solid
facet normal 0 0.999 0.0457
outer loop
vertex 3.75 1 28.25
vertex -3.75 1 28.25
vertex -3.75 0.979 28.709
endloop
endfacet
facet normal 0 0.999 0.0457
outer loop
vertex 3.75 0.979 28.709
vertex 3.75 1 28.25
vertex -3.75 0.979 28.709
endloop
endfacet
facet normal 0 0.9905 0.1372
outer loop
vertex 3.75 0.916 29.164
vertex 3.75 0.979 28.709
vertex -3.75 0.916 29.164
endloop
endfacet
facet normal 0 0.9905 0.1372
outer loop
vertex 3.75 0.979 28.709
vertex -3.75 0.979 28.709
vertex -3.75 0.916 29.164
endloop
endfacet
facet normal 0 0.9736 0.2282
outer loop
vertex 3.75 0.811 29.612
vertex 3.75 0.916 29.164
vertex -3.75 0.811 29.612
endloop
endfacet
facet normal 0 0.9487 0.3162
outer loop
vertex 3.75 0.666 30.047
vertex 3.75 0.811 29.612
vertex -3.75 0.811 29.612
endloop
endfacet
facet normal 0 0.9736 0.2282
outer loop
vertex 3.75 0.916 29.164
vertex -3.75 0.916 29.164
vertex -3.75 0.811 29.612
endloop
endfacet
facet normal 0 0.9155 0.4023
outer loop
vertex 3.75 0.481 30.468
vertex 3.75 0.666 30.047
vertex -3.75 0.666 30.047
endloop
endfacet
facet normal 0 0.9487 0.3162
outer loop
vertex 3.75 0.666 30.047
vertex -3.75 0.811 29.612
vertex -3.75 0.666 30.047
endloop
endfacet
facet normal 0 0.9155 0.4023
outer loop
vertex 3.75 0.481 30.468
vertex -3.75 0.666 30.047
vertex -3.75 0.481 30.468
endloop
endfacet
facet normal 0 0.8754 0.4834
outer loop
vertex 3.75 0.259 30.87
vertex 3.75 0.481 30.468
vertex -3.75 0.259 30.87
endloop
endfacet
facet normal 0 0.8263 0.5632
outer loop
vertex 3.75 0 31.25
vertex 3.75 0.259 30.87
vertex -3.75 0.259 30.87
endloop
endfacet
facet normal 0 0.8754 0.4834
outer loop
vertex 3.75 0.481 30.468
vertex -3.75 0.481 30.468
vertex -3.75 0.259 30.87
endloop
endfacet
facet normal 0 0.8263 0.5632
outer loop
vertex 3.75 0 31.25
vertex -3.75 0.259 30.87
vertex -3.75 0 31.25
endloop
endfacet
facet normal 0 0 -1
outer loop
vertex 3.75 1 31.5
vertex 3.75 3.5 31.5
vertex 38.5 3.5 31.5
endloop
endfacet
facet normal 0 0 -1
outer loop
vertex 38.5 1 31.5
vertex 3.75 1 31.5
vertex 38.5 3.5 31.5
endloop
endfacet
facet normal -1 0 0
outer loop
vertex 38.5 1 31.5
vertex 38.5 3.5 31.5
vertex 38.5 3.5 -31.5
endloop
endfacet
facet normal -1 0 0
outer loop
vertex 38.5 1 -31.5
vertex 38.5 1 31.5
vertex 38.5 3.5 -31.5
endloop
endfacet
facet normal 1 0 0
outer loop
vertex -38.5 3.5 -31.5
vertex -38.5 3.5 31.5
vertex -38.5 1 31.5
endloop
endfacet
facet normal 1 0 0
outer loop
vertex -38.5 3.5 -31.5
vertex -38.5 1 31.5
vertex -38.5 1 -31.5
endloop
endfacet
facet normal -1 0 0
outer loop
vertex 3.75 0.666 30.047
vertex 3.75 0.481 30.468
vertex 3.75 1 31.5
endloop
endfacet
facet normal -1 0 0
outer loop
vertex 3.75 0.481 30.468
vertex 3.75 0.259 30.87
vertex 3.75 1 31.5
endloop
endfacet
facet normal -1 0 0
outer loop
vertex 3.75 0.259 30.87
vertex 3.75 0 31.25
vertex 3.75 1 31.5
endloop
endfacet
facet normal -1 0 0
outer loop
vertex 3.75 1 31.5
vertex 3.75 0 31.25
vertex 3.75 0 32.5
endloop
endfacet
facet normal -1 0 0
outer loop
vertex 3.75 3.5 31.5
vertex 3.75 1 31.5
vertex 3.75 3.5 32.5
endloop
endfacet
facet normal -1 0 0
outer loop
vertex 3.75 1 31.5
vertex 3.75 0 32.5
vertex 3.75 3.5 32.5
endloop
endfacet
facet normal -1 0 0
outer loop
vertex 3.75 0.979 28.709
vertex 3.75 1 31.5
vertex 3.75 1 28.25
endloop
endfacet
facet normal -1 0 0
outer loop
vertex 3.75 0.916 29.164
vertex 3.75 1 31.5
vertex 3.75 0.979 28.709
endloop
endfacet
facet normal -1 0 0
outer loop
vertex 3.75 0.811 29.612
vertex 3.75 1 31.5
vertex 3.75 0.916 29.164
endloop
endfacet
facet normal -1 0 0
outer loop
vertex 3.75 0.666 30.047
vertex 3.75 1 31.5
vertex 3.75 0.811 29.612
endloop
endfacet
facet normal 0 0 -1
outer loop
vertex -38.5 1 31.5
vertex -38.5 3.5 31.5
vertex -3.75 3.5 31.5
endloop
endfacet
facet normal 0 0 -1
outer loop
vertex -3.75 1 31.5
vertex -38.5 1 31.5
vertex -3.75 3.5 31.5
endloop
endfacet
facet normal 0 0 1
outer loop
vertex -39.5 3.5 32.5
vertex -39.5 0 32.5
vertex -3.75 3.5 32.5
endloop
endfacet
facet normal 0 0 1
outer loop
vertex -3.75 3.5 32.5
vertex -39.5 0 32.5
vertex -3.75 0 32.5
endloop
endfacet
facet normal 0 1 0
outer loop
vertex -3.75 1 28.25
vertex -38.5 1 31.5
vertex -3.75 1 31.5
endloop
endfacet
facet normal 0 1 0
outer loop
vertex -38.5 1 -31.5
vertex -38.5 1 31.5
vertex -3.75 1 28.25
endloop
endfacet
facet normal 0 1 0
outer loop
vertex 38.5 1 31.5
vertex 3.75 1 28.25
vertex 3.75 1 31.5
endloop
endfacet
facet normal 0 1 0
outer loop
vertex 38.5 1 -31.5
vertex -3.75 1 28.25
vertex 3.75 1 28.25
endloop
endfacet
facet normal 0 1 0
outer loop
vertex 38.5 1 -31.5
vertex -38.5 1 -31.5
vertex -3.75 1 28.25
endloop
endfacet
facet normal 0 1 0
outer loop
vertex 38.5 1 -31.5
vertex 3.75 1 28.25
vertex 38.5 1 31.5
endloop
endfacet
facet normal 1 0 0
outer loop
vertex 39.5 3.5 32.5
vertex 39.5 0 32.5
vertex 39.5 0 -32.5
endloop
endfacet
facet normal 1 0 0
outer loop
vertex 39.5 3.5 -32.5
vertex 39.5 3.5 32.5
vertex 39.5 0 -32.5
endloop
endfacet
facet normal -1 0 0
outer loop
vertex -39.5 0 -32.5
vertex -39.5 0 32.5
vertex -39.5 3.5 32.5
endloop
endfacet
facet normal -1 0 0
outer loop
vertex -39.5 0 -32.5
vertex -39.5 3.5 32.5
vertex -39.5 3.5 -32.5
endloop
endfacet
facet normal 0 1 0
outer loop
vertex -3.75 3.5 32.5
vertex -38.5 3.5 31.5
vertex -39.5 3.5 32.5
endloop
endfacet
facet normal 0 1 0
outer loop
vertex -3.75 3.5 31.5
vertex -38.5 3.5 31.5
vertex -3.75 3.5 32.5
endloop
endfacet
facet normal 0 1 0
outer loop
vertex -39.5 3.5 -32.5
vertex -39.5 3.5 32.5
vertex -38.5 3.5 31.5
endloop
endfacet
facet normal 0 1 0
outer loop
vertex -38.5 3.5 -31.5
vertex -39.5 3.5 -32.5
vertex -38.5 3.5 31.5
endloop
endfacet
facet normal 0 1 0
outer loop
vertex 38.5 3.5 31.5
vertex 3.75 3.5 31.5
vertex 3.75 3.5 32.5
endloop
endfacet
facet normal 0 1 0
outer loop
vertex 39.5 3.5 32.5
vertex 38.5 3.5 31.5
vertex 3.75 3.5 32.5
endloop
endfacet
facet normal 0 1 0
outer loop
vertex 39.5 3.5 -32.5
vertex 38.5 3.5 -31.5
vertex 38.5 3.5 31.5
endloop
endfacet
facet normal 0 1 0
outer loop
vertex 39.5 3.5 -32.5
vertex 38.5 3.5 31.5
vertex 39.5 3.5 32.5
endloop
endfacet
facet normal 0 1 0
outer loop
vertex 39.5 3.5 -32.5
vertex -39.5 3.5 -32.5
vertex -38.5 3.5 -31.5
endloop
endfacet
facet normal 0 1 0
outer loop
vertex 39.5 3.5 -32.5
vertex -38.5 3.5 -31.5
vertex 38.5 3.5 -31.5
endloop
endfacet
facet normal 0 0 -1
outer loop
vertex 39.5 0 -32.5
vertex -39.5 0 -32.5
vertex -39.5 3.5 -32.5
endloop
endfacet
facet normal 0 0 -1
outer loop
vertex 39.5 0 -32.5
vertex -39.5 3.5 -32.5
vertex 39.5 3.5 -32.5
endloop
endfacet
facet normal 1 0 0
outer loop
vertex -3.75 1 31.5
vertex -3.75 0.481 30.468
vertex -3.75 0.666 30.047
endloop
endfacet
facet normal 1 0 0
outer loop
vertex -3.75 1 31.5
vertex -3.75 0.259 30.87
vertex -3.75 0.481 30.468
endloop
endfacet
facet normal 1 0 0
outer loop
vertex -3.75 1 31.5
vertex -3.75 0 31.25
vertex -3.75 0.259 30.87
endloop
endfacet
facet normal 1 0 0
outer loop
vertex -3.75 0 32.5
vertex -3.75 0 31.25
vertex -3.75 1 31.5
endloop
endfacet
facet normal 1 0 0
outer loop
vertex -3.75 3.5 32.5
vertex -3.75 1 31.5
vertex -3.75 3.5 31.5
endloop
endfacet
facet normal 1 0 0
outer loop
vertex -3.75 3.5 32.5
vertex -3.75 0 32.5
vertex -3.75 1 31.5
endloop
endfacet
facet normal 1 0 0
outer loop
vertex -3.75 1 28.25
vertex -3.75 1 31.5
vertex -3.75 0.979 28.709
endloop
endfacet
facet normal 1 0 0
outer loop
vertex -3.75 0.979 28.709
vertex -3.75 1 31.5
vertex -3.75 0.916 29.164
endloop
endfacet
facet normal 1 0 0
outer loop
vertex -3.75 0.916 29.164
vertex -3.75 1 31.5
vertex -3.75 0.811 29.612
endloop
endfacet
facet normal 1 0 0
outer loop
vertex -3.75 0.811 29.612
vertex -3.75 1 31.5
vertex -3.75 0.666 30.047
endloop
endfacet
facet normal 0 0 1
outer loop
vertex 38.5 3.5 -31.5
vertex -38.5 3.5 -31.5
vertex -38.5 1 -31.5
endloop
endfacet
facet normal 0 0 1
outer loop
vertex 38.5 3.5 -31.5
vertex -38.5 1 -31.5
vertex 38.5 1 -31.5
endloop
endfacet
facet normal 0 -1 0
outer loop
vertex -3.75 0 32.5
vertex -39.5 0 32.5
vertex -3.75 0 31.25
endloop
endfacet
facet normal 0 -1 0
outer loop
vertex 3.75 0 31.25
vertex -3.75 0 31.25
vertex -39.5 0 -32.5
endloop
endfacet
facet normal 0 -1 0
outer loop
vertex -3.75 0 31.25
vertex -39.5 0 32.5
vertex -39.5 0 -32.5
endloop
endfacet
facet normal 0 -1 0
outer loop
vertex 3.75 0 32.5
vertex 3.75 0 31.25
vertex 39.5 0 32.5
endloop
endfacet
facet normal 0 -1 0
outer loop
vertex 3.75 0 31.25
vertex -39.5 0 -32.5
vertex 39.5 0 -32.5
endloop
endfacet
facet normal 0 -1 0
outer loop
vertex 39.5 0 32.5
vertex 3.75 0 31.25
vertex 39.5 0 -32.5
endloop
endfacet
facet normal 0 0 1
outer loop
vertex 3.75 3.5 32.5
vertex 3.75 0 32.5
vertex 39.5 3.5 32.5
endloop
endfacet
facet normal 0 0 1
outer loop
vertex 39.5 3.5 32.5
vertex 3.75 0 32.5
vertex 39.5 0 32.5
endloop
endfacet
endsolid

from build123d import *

# Parameters (mm, degrees)
ESQUISSE1_W             = 79
ESQUISSE1_H             = 65
BOSS_EXTRU_1_DEPTH      = 3.5
ESQUISSE2_W             = 77
ESQUISSE2_H             = 63
ENL_V_MAT_EXTRU_1_DEPTH = 2.5
ESQUISSE3_W             = 7.5
ESQUISSE3_H             = 7.5
ENL_V_MAT_EXTRU_2_DEPTH = 1.25
CONG_1_R                = 5


with BuildPart() as part:
    # Esquisse1 → Boss.-Extru.1 (new body)
    with BuildSketch(Plane(origin=(0, 0, 0), x_dir=(1, 0, 0), z_dir=(0, 1, 0))):
        Rectangle(ESQUISSE1_W, ESQUISSE1_H)
    extrude(amount=BOSS_EXTRU_1_DEPTH)

    # Esquisse2 → Enlèv. mat.-Extru.1 (cut)
    with BuildSketch(Plane(origin=(0, 3.5, 0), x_dir=(1, 0, 0), z_dir=(0, 1, 0))):
        Rectangle(ESQUISSE2_W, ESQUISSE2_H)
    extrude(amount=-ENL_V_MAT_EXTRU_1_DEPTH, mode=Mode.SUBTRACT)

    # Esquisse3 → Enlèv. mat.-Extru.2 (cut)
    with BuildSketch(Plane.XY.offset(32.5)):
        with Locations((0, 1.75)):
            Rectangle(ESQUISSE3_W, ESQUISSE3_H)
    extrude(amount=-ENL_V_MAT_EXTRU_2_DEPTH, mode=Mode.SUBTRACT)

    # Congé1
    # the kernel refuses this fillet: 5 mm, written as the material it takes off along each edge
    with BuildSketch(Plane(origin=(-3.75, 1, 31.25), x_dir=(0, -1, 0), z_dir=(1, 0, 0))) as cong_1_piece_1:
        with BuildLine():
            CenterArc((5, 3), CONG_1_R, 180, 36.869897646)
            Line((0, 3), (-0.1, 3))
            Line((-0.1, 3), (-0.1, 0))
            Line((-0.1, 0), (0, -0.1))
            ThreePointArc((0, -0.1), (0.5, -0.1), (0.92, -0.06))
            Line((0.92, -0.06), (1, 0))
        make_face()
    extrude(amount=7.5, mode=Mode.SUBTRACT)


solid = part.part
